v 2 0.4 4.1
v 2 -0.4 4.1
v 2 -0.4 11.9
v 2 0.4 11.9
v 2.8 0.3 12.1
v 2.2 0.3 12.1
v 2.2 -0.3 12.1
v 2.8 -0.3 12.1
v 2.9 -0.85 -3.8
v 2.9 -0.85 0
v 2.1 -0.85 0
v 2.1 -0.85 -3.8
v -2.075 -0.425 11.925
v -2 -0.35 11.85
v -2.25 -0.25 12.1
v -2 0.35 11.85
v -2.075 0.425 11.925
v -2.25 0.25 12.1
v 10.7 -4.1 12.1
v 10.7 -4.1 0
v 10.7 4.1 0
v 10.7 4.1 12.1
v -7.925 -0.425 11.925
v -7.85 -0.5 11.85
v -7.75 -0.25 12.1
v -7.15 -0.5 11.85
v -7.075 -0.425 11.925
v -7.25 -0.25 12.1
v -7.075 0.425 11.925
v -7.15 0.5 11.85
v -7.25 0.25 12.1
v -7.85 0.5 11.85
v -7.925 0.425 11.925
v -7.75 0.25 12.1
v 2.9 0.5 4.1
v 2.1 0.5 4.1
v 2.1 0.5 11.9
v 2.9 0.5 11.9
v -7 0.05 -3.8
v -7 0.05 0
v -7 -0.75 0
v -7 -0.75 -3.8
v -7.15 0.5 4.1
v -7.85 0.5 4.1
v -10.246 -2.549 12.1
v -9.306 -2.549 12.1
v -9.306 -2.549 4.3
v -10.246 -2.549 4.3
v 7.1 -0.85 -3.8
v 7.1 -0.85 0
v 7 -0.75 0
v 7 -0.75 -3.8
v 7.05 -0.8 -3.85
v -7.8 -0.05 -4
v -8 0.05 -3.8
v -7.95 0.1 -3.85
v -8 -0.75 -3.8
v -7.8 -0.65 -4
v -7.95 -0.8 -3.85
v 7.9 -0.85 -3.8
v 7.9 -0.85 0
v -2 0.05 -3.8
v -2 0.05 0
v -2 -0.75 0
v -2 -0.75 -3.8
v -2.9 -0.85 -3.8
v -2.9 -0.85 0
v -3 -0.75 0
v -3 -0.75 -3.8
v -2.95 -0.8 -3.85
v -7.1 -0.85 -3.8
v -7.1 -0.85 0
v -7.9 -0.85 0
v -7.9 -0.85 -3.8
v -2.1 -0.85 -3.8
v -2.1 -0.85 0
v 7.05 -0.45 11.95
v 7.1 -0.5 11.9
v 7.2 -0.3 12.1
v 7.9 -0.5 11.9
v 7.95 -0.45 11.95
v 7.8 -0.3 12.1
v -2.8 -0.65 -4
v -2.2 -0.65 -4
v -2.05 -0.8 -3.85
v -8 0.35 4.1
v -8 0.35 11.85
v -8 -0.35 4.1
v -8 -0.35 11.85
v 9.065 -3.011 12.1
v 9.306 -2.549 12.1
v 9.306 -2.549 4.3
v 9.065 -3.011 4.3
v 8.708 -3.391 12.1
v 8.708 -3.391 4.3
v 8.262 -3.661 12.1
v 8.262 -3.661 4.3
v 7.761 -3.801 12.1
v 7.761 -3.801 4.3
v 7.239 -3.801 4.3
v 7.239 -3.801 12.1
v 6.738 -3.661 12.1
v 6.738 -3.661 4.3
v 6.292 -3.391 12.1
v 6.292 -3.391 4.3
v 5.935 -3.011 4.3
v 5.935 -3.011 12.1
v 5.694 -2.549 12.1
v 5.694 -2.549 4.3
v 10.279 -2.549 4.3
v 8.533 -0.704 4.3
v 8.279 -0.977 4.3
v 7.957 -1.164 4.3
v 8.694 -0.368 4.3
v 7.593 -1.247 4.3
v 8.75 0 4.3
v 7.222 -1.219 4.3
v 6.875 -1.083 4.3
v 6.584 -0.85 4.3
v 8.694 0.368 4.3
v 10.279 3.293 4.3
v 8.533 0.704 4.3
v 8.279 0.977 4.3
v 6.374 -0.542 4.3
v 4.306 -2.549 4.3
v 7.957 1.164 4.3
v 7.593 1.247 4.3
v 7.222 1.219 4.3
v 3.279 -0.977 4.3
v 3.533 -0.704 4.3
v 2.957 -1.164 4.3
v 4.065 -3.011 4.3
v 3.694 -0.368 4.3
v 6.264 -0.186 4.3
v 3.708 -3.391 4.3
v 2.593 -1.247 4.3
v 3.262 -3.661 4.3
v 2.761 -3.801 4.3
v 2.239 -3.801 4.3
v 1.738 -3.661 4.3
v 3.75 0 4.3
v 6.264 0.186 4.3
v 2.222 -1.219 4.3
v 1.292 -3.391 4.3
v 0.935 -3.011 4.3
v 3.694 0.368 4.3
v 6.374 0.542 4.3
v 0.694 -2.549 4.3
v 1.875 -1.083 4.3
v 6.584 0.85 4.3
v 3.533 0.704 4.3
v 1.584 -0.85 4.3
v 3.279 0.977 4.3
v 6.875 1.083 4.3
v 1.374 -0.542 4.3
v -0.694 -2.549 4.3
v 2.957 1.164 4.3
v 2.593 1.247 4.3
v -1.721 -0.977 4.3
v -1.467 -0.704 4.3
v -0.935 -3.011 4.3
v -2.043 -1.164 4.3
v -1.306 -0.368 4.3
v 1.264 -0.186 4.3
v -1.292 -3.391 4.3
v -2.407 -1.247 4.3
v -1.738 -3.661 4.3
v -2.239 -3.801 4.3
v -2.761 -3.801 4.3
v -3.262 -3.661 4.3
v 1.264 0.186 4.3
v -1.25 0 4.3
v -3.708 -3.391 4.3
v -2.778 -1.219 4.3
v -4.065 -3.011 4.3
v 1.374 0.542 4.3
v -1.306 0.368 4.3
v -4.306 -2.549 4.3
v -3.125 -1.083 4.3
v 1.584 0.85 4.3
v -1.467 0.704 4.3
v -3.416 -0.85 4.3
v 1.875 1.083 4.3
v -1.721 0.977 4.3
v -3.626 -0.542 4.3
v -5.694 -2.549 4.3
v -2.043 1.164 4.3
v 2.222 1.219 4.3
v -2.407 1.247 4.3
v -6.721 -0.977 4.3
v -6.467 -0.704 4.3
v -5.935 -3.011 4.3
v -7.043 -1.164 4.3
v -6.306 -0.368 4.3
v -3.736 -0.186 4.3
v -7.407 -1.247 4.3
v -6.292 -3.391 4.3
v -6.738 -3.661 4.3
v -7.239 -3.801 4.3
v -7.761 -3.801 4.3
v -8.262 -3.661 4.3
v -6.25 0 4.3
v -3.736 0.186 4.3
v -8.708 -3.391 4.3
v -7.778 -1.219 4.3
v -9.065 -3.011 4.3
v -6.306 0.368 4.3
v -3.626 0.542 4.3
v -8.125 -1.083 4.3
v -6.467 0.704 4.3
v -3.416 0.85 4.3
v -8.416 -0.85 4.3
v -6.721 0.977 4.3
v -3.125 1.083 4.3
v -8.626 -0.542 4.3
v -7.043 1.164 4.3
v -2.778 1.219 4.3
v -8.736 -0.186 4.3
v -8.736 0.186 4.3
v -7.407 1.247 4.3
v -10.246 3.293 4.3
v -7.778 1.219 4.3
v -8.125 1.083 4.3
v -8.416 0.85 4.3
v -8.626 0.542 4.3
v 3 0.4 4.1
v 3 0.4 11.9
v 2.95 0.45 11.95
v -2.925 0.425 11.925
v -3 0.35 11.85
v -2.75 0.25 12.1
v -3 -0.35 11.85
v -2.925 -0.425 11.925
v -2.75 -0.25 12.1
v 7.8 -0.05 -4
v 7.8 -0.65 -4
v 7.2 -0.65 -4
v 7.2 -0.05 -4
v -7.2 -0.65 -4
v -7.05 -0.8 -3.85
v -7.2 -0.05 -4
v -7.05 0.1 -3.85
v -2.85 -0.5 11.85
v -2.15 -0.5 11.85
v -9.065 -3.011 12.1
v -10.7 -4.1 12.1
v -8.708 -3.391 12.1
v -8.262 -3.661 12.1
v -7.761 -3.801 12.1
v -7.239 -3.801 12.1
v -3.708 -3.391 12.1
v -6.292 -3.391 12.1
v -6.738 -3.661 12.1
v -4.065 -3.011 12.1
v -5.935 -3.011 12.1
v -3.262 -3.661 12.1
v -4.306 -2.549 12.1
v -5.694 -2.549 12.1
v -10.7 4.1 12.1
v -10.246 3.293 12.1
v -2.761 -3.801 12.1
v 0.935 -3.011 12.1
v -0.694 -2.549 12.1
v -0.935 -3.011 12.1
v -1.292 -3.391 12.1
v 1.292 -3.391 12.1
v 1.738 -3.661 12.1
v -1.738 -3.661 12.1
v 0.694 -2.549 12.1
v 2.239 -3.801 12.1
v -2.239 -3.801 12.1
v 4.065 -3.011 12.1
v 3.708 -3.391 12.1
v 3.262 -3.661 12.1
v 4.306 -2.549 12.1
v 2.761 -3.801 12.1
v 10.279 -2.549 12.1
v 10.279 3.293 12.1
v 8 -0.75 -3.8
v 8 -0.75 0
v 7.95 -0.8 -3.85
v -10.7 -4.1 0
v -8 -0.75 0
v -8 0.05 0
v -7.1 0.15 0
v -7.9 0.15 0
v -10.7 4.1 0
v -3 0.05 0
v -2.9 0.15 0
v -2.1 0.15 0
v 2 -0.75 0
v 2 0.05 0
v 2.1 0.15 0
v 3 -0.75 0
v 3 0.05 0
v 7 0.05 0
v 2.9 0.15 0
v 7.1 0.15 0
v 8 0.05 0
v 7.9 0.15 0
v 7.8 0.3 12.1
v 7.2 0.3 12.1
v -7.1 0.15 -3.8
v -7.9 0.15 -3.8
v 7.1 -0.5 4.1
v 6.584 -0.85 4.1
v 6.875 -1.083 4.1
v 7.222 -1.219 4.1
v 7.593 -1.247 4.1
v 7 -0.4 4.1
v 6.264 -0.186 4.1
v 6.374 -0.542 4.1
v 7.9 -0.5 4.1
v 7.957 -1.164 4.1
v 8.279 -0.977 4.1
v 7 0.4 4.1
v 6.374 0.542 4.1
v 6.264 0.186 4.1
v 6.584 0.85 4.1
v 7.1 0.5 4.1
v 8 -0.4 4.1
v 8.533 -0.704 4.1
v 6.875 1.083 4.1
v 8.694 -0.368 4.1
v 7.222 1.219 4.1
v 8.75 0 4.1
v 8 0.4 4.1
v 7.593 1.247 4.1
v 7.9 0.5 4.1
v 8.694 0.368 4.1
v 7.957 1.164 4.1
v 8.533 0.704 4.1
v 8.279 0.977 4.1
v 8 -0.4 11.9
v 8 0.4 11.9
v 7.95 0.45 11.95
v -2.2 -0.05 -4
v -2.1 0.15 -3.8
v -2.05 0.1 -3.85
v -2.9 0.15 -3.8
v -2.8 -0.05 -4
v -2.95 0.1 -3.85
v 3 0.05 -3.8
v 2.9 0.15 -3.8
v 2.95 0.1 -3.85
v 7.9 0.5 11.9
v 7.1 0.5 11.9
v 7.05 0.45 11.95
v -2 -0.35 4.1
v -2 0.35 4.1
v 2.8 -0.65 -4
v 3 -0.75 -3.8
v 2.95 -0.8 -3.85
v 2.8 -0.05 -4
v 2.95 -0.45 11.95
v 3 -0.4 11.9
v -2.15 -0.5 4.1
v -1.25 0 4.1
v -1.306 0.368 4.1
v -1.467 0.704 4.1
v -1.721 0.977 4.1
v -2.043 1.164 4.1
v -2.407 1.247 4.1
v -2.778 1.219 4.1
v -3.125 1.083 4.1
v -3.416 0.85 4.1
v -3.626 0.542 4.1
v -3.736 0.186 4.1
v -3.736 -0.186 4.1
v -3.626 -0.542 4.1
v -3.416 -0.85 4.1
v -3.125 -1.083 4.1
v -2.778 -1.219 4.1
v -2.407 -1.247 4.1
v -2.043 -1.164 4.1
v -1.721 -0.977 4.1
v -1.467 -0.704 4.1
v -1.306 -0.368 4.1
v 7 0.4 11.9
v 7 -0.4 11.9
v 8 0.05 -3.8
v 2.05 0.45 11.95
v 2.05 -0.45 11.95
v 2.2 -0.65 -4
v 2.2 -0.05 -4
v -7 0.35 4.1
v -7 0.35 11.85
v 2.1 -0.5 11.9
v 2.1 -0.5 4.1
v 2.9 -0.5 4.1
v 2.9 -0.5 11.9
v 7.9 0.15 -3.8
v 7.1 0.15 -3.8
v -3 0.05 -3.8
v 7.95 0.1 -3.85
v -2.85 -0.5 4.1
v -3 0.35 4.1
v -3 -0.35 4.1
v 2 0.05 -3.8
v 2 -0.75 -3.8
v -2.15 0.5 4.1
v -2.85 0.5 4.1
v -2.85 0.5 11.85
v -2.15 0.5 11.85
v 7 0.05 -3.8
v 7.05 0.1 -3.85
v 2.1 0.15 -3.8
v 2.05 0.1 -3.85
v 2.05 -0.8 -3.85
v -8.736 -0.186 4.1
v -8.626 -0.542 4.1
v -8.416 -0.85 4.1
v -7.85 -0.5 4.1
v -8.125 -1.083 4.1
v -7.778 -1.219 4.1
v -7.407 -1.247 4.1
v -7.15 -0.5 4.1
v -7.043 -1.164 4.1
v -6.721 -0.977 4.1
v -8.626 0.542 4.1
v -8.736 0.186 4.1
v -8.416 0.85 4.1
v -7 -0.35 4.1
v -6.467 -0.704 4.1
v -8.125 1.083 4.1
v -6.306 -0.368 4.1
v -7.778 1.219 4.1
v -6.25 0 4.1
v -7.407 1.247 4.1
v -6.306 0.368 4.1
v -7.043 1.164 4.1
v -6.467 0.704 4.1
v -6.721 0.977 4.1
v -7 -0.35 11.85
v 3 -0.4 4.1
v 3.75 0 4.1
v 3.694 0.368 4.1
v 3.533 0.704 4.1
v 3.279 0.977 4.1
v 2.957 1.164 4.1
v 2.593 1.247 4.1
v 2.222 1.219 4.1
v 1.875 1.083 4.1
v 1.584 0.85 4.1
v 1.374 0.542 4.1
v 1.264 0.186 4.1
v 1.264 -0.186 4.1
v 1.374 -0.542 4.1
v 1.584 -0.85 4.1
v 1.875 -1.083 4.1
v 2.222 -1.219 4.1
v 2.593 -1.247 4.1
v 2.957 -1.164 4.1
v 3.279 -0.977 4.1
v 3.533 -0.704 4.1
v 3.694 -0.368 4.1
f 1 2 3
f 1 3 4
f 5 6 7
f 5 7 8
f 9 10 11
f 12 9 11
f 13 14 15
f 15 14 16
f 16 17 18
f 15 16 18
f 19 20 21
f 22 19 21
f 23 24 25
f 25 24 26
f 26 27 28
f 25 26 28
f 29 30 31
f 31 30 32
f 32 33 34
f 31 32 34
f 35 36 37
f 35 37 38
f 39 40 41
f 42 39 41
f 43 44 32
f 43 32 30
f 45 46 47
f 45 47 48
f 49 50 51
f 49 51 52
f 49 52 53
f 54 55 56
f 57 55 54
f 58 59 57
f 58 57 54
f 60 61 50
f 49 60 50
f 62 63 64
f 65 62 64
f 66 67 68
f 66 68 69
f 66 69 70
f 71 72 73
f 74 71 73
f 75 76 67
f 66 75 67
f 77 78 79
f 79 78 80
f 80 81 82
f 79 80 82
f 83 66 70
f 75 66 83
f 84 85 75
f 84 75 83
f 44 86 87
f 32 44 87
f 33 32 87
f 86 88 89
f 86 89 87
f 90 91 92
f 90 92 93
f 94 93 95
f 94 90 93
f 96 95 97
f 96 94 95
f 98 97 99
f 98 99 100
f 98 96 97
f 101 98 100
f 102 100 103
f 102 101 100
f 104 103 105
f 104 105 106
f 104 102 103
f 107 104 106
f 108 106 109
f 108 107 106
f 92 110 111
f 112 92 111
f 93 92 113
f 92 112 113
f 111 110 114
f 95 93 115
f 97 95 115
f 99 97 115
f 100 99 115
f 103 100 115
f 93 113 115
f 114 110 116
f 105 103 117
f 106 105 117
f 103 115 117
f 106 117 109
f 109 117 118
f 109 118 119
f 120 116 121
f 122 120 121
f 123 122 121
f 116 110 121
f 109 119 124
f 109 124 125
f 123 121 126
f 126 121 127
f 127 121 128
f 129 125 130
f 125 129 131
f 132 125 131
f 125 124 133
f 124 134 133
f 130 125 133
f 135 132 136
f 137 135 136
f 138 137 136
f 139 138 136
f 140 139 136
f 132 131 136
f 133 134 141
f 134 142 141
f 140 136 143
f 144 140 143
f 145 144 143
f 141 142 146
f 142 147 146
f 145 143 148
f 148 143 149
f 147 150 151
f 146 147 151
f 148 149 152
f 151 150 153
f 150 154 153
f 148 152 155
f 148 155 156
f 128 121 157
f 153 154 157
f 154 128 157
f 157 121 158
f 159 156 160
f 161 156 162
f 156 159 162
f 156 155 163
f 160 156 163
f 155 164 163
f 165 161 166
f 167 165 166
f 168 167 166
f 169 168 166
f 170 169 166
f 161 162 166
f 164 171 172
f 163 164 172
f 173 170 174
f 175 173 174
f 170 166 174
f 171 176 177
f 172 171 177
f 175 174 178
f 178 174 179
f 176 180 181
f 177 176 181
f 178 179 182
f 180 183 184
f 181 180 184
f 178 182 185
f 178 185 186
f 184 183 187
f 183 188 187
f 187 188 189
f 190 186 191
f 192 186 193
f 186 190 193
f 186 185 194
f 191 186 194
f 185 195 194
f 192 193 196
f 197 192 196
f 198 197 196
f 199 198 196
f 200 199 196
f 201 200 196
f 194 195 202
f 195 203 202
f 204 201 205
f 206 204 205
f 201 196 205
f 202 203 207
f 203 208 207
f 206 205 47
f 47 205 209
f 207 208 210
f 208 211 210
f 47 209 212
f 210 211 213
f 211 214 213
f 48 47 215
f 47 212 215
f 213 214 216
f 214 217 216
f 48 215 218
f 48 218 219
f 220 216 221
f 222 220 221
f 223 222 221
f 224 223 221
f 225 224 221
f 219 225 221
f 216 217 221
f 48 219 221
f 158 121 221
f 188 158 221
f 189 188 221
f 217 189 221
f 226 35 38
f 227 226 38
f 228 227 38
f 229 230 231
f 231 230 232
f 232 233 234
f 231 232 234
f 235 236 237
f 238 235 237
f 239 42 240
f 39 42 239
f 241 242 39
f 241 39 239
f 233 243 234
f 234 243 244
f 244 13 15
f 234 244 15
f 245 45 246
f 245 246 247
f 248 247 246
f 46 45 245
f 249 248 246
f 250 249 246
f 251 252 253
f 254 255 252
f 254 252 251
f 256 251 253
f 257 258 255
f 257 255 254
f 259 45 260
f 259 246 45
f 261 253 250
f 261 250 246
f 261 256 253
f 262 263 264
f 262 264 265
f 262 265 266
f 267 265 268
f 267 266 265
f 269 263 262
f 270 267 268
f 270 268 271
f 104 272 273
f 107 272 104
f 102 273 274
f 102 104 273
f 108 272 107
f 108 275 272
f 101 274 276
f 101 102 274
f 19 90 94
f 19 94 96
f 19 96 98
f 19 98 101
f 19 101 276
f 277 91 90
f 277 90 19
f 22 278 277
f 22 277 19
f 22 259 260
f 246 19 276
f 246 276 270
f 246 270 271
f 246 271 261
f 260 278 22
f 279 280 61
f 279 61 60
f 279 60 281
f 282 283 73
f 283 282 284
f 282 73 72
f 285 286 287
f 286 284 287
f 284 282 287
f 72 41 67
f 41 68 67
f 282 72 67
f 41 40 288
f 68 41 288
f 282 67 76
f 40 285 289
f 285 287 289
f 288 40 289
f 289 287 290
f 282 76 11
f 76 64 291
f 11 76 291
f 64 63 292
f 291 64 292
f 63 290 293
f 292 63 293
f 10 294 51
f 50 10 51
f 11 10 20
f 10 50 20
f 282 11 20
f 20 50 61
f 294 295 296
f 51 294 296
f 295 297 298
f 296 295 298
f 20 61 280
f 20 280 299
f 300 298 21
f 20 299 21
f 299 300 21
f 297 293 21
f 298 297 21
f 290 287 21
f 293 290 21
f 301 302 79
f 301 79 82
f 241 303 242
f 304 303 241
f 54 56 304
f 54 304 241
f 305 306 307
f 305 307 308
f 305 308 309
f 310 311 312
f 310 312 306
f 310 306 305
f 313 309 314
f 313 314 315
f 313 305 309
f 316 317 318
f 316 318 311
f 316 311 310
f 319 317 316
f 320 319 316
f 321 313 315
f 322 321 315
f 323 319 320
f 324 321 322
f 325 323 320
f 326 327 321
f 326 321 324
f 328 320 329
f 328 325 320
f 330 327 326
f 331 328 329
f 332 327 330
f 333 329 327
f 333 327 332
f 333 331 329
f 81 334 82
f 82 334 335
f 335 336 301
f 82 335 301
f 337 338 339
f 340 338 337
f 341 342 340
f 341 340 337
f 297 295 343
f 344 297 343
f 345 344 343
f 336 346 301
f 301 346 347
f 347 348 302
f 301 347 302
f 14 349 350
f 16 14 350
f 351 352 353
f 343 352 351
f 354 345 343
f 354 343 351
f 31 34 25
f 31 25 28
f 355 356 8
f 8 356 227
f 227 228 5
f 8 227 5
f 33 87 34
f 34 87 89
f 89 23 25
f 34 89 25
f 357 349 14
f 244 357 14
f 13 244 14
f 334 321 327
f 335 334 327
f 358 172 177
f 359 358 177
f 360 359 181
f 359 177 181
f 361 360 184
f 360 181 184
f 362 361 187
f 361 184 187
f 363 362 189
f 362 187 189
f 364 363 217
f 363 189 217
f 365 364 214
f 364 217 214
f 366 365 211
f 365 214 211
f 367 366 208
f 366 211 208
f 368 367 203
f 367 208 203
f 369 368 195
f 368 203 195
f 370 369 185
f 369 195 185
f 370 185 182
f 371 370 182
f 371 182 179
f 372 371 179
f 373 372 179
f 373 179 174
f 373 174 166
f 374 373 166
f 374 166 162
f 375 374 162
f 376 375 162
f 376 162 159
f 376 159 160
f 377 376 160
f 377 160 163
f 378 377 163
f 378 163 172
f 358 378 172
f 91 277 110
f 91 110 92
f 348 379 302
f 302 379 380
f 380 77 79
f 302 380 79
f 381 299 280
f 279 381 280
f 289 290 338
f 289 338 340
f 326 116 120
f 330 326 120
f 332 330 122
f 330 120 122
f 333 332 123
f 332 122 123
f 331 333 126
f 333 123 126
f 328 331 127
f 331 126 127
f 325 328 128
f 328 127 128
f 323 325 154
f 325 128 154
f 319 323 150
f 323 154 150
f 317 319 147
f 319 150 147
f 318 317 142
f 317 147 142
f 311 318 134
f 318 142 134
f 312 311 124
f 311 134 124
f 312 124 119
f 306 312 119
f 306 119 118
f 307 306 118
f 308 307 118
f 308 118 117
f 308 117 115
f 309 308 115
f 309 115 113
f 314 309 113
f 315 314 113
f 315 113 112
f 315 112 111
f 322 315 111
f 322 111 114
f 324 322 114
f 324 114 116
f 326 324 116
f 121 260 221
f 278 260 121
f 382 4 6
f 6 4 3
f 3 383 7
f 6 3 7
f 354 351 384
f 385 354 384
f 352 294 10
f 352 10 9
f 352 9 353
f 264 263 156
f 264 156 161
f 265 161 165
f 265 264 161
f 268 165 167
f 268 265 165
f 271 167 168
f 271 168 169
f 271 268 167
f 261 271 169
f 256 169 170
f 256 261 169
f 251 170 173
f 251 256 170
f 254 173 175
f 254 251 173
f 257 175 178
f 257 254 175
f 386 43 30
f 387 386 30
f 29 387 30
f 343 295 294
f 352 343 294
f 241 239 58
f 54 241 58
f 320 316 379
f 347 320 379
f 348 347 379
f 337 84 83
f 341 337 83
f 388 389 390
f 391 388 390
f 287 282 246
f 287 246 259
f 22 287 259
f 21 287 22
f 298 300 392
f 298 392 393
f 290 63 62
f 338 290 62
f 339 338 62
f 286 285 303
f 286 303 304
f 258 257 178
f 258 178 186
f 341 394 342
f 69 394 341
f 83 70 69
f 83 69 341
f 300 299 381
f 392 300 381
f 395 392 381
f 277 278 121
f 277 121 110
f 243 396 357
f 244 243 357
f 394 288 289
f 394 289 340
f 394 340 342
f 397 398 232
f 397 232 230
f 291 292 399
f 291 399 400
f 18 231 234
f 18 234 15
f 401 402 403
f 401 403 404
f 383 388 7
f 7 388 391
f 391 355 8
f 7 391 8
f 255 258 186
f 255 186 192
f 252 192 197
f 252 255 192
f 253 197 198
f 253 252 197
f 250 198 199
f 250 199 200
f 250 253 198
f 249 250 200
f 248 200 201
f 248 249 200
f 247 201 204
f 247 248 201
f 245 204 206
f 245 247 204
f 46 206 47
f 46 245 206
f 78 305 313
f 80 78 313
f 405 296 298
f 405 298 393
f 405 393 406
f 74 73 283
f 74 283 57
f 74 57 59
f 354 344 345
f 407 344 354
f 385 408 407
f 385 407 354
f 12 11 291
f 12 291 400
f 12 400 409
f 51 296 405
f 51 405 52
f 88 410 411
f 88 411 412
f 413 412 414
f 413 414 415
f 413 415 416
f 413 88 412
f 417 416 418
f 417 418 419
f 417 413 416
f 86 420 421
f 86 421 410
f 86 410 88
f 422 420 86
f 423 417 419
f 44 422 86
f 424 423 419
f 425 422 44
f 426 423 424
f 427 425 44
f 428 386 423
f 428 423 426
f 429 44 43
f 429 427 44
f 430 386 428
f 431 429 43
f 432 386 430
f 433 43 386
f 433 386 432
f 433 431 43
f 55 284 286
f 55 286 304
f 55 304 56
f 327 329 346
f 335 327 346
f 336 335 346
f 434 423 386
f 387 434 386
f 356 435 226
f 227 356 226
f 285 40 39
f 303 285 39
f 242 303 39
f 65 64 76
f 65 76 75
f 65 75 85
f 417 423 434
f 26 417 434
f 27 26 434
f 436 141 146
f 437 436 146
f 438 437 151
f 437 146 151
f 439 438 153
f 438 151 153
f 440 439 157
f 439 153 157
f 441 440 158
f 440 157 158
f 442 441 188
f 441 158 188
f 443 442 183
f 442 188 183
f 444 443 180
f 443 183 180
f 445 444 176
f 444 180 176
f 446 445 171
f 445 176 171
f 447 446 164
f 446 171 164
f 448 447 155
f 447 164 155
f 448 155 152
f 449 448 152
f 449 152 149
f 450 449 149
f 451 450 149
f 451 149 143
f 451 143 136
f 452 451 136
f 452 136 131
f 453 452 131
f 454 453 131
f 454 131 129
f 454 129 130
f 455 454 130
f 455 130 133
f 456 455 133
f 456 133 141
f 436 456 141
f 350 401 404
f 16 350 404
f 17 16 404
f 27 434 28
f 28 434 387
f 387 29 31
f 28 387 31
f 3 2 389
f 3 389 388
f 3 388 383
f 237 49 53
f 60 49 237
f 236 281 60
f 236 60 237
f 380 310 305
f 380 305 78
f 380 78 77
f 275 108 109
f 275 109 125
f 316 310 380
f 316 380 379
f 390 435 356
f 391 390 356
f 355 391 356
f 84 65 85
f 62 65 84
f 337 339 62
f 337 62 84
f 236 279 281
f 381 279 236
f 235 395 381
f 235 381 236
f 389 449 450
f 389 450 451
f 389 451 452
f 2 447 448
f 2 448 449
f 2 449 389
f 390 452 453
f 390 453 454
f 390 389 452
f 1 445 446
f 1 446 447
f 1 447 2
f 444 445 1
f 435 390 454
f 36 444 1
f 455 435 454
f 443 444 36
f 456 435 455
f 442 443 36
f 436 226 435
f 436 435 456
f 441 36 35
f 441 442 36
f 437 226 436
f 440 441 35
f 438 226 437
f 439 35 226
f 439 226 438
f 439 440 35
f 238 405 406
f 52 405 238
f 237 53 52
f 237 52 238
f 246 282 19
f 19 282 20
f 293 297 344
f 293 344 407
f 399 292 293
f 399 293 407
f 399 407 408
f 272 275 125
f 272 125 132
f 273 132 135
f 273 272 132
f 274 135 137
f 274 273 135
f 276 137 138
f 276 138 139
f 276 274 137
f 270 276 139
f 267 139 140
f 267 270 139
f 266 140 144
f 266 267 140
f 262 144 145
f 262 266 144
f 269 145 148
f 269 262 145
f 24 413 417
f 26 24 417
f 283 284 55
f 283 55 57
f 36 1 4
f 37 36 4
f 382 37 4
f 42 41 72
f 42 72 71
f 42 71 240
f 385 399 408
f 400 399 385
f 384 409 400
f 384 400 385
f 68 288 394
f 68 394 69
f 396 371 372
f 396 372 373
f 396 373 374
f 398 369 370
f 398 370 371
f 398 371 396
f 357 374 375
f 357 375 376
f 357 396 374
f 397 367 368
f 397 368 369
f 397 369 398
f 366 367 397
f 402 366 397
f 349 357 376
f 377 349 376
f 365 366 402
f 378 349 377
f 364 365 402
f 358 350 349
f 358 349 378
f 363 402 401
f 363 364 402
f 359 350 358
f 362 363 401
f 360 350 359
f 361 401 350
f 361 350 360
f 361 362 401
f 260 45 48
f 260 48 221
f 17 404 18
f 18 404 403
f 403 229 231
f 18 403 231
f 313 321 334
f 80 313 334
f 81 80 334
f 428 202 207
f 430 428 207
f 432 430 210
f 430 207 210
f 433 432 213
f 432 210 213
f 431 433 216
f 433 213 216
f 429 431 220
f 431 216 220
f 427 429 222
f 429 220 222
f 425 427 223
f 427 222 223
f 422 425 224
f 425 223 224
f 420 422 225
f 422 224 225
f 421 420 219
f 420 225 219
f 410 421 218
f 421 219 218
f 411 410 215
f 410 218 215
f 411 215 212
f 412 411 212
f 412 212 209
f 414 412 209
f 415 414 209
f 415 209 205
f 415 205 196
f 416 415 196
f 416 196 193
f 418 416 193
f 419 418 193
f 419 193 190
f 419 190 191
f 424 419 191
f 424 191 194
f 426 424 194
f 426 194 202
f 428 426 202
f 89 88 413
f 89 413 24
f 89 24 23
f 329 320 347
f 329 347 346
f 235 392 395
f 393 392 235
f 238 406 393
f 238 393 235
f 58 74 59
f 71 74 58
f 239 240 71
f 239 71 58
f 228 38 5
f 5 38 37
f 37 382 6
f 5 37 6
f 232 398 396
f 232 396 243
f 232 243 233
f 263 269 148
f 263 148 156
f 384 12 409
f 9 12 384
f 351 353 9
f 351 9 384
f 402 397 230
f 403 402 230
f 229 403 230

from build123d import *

# Parameters (mm, degrees)
SKETCH_1_W          = 21.4
SKETCH_1_H          = 8.2
EXTRUDE_1_DEPTH     = 12.1
SKETCH_4_R          = 1.25
CUT_EXTRUDE_3_DEPTH = 8
CUT_EXTRUDE_4_DEPTH = 7.8
SKETCH_7_W          = 1
SKETCH_7_H          = 1
EXTRUDE_2_DEPTH     = 8
CHAMFER_1_SIZE      = 0.15
CHAMFER_2_SIZE      = 0.25
SKETCH_8_W          = 1
SKETCH_8_H          = 1
EXTRUDE_3_DEPTH     = 4
CHAMFER_6_SIZE      = 0.1
CHAMFER_7_SIZE      = 0.2
CHAMFER_10_SIZE     = 0.1
CHAMFER_11_SIZE     = 0.2
CHAMFER_12_SIZE     = 0.1
CHAMFER_13_SIZE     = 0.2
CHAMFER_14_SIZE     = 0.1
CHAMFER_15_SIZE     = 0.2


with BuildPart() as part:
    # Эскиз1 → Бобышка-Вытянуть1 (new body)
    with BuildSketch(Plane.XY):
        Rectangle(SKETCH_1_W, SKETCH_1_H)
    extrude(amount=EXTRUDE_1_DEPTH)

    # Эскиз4 → Вырез-Вытянуть3 (cut)
    with BuildSketch(Plane.XY.offset(12.1)):
        with Locations((-7.5, 0)):
            Circle(SKETCH_4_R)
        with Locations((-2.5, 0)):
            Circle(SKETCH_4_R)
        with Locations((2.5, 0)):
            Circle(SKETCH_4_R)
        with Locations((7.5, 0)):
            Circle(SKETCH_4_R)
    extrude(amount=-CUT_EXTRUDE_3_DEPTH, mode=Mode.SUBTRACT)

    # Эскиз5 → Вырез-Вытянуть4 (cut)
    with BuildSketch(Plane.XY.offset(12.1)):
        with BuildLine():
            Line((-10.245621634, 0), (-10.245621634, 3.292901982))
            Line((-10.245621634, 3.292901982), (0.278509544, 3.292901982))
            Line((0.278509544, 3.292901982), (5.278509544, 3.292901982))
            Line((5.278509544, 3.292901982), (10.278509544, 3.292901982))
            Line((10.278509544, 3.292901982), (10.278509544, -2.548957219))
            Line((10.278509544, -2.548957219), (9.30582632, -2.548957219))
            ThreePointArc((9.30582632, -2.548957219), (7.5, -3.818893996), (5.69417368, -2.548957219))
            Line((5.69417368, -2.548957219), (4.30582632, -2.548957219))
            ThreePointArc((4.30582632, -2.548957219), (2.5, -3.818893996), (0.69417368, -2.548957219))
            Line((0.69417368, -2.548957219), (-0.69417368, -2.548957219))
            ThreePointArc((-0.69417368, -2.548957219), (-2.5, -3.818893996), (-4.30582632, -2.548957219))
            Line((-4.30582632, -2.548957219), (-5.69417368, -2.548957219))
            ThreePointArc((-5.69417368, -2.548957219), (-7.5, -3.818893996), (-9.30582632, -2.548957219))
            Line((-9.30582632, -2.548957219), (-10.245621634, -2.548957219))
            Line((-10.245621634, -2.548957219), (-10.245621634, 0))
        make_face()
    extrude(amount=-CUT_EXTRUDE_4_DEPTH, mode=Mode.SUBTRACT)

    # Эскиз7 → Бобышка-Вытянуть2 (add)
    with BuildSketch(Plane.XY.offset(4.1)):
        with Locations((-2.5, 0)):
            Rectangle(SKETCH_7_W, SKETCH_7_H)
        with Locations((-7.5, 0)):
            Rectangle(SKETCH_7_W, SKETCH_7_H)
        with Locations((2.5, 0)):
            Rectangle(SKETCH_7_W, SKETCH_7_H)
        with Locations((7.5, 0)):
            Rectangle(SKETCH_7_W, SKETCH_7_H)
    extrude(amount=EXTRUDE_2_DEPTH)

    # Фаска1
    chamfer_1_edges = [part.edges().sort_by_distance(p)[0] for p in [
        (-7, -0.5, 8.1),
        (-7, 0.5, 8.1),
        (-8, 0.5, 8.1),
        (-8, -0.5, 8.1),
        (-2, -0.5, 8.1),
        (-2, 0.5, 8.1),
        (-3, 0.5, 8.1),
        (-3, -0.5, 8.1),
    ]]
    chamfer(chamfer_1_edges, length=CHAMFER_1_SIZE)

    # Фаска2
    # the kernel refuses this chamfer: 0.25 mm, written as the material it takes off along each edge
    with BuildSketch(Plane(origin=(-3, -0.992920747, 12.1), x_dir=(-0.02749587661058555, 0, -0.9996219169112968), z_dir=(0, 1, 0)), Plane(origin=(-3.492920747, 0.5, 12.1), x_dir=(0, 0.027495876610586414, -0.9996219169112968), z_dir=(1, 0, 0)), Plane(origin=(-2, 0.992920747, 12.1), x_dir=(0.027495876610586414, 0, -0.9996219169112968), z_dir=(0, -1, 0)), Plane(origin=(-1.507079253, -0.5, 12.1), x_dir=(0, -0.027495876610586414, -0.9996219169112968), z_dir=(-1, 0, 0)), Plane(origin=(-7, 0.992920747, 12.1), x_dir=(0.02749587661058555, 0, -0.9996219169112968), z_dir=(0, -1, 0)), Plane(origin=(-6.507079253, -0.5, 12.1), x_dir=(0, -0.027495876610586414, -0.9996219169112968), z_dir=(-1, 0, 0)), Plane(origin=(-8, -0.992920747, 12.1), x_dir=(-0.027495876610589005, 0, -0.9996219169112968), z_dir=(0, 1, 0)), Plane(origin=(-8.492920747, 0.5, 12.1), x_dir=(0, 0.027495876610586414, -0.9996219169112968), z_dir=(1, 0, 0))) as chamfer_2_piece_1:
        Polygon((CHAMFER_2_SIZE * 0.999621916911, -CHAMFER_2_SIZE * 0.0274958766106), (-CHAMFER_2_SIZE * 0.0274958766106, -CHAMFER_2_SIZE * 0.999621916911), (0, 0), align=None)
    extrude(amount=1.985841494, mode=Mode.SUBTRACT)

    # Эскиз8 → Бобышка-Вытянуть3 (add)
    with BuildSketch(Plane(origin=(0, -4.1, 0), x_dir=(-1, 0, 0), z_dir=(0, 0, 1))):
        with Locations((2.5, -3.75)):
            Rectangle(SKETCH_8_W, SKETCH_8_H)
        with Locations((7.5, -3.75)):
            Rectangle(SKETCH_8_W, SKETCH_8_H)
        with Locations((-2.5, -3.75)):
            Rectangle(SKETCH_8_W, SKETCH_8_H)
        with Locations((-7.5, -3.75)):
            Rectangle(SKETCH_8_W, SKETCH_8_H)
    extrude(amount=-EXTRUDE_3_DEPTH)

    # Фаска6
    chamfer_6_edges = [part.edges().sort_by_distance(p)[0] for p in [
        (3, -0.5, 8.1),
        (3, 0.5, 8.1),
        (2, 0.5, 8.1),
        (2, -0.5, 8.1),
    ]]
    chamfer(chamfer_6_edges, length=CHAMFER_6_SIZE)

    # Фаска7
    # the kernel refuses this chamfer: 0.2 mm, written as the material it takes off along each edge
    with BuildSketch(Plane(origin=(3, 0.914336598, 12.1), x_dir=(0.02749587661058742, 0, -0.9996219169112966), z_dir=(0, -1, 0)), Plane(origin=(3.414336598, -0.5, 12.1), x_dir=(0, -0.02749587661058634, -0.9996219169112966), z_dir=(-1, 0, 0)), Plane(origin=(2, -0.914336598, 12.1), x_dir=(-0.02749587661058634, 0, -0.9996219169112966), z_dir=(0, 1, 0)), Plane(origin=(1.585663402, 0.5, 12.1), x_dir=(0, 0.02749587661058634, -0.9996219169112966), z_dir=(1, 0, 0))) as chamfer_7_piece_1:
        Polygon((CHAMFER_7_SIZE * 0.999621916911, -CHAMFER_7_SIZE * 0.0274958766106), (-CHAMFER_7_SIZE * 0.0274958766106, -CHAMFER_7_SIZE * 0.999621916911), (0, 0), align=None)
    extrude(amount=1.828673195, mode=Mode.SUBTRACT)

    # Фаска10
    chamfer_10_edges = [part.edges().sort_by_distance(p)[0] for p in [
        (-7, 0.15, -2),
        (-7, -0.85, -2),
        (-8, -0.85, -2),
        (-8, 0.15, -2),
        (-2, 0.15, -2),
        (-2, -0.85, -2),
        (-3, -0.85, -2),
        (-3, 0.15, -2),
        (3, 0.15, -2),
        (3, -0.85, -2),
        (2, -0.85, -2),
        (2, 0.15, -2),
    ]]
    chamfer(chamfer_10_edges, length=CHAMFER_10_SIZE)

    # Фаска11
    # the kernel refuses this chamfer: 0.2 mm, written as the material it takes off along each edge
    with BuildSketch(Plane(origin=(-7, 0.564336598, -4), x_dir=(0.027495876610587302, 0, 0.9996219169112966), z_dir=(0, -1, 0)), Plane(origin=(-8.414336598, 0.15, -4), x_dir=(0, 0.027495876610586355, 0.9996219169112966), z_dir=(1, 0, 0)), Plane(origin=(-8, -1.264336598, -4), x_dir=(-0.027495876610587302, 0, 0.9996219169112966), z_dir=(0, 1, 0)), Plane(origin=(-6.585663402, -0.85, -4), x_dir=(0, -0.027495876610586223, 0.9996219169112966), z_dir=(-1, 0, 0)), Plane(origin=(-1.585663402, -0.85, -4), x_dir=(0, -0.027495876610586223, 0.9996219169112966), z_dir=(-1, 0, 0)), Plane(origin=(-3, -1.264336598, -4), x_dir=(-0.027495876610587302, 0, 0.9996219169112966), z_dir=(0, 1, 0)), Plane(origin=(-3.414336598, 0.15, -4), x_dir=(0, 0.027495876610586355, 0.9996219169112966), z_dir=(1, 0, 0)), Plane(origin=(-2, 0.564336598, -4), x_dir=(0.027495876610586223, 0, 0.9996219169112966), z_dir=(0, -1, 0)), Plane(origin=(2, -1.264336598, -4), x_dir=(-0.027495876610586223, 0, 0.9996219169112966), z_dir=(0, 1, 0)), Plane(origin=(1.585663402, 0.15, -4), x_dir=(0, 0.027495876610586355, 0.9996219169112966), z_dir=(1, 0, 0)), Plane(origin=(3, 0.564336598, -4), x_dir=(0.027495876610587302, 0, 0.9996219169112966), z_dir=(0, -1, 0)), Plane(origin=(3.414336598, -0.85, -4), x_dir=(0, -0.027495876610586223, 0.9996219169112966), z_dir=(-1, 0, 0))) as chamfer_11_piece_1:
        Polygon((CHAMFER_11_SIZE * 0.999621916911, CHAMFER_11_SIZE * 0.0274958766106), (-CHAMFER_11_SIZE * 0.0274958766106, CHAMFER_11_SIZE * 0.999621916911), (0, 0), align=None)
    extrude(amount=1.828673195, mode=Mode.SUBTRACT)

    # Фаска12
    chamfer_12_edges = [part.edges().sort_by_distance(p)[0] for p in [
        (8, 0.15, -2),
        (8, -0.85, -2),
        (7, -0.85, -2),
        (7, 0.15, -2),
    ]]
    chamfer(chamfer_12_edges, length=CHAMFER_12_SIZE)

    # Фаска13
    # the kernel refuses this chamfer: 0.2 mm, written as the material it takes off along each edge
    with BuildSketch(Plane(origin=(6.585663402, 0.15, -4), x_dir=(0, 0.027495876610586355, 0.9996219169112966), z_dir=(1, 0, 0)), Plane(origin=(8, 0.564336598, -4), x_dir=(0.027495876610587302, 0, 0.9996219169112966), z_dir=(0, -1, 0)), Plane(origin=(7, -1.264336598, -4), x_dir=(-0.027495876610587302, 0, 0.9996219169112966), z_dir=(0, 1, 0)), Plane(origin=(8.414336598, -0.85, -4), x_dir=(0, -0.027495876610586223, 0.9996219169112966), z_dir=(-1, 0, 0))) as chamfer_13_piece_1:
        Polygon((CHAMFER_13_SIZE * 0.999621916911, CHAMFER_13_SIZE * 0.0274958766106), (-CHAMFER_13_SIZE * 0.0274958766106, CHAMFER_13_SIZE * 0.999621916911), (0, 0), align=None)
    extrude(amount=1.828673195, mode=Mode.SUBTRACT)

    # Фаска14
    chamfer_14_edges = [part.edges().sort_by_distance(p)[0] for p in [
        (8, -0.5, 8.1),
        (8, 0.5, 8.1),
        (7, 0.5, 8.1),
        (7, -0.5, 8.1),
    ]]
    chamfer(chamfer_14_edges, length=CHAMFER_14_SIZE)

    # Фаска15
    # the kernel refuses this chamfer: 0.2 mm, written as the material it takes off along each edge
    with BuildSketch(Plane(origin=(7, -0.914336598, 12.1), x_dir=(-0.02749587661058742, 0, -0.9996219169112966), z_dir=(0, 1, 0)), Plane(origin=(8.414336598, -0.5, 12.1), x_dir=(0, -0.02749587661058634, -0.9996219169112966), z_dir=(-1, 0, 0)), Plane(origin=(8, 0.914336598, 12.1), x_dir=(0.02749587661058742, 0, -0.9996219169112966), z_dir=(0, -1, 0)), Plane(origin=(6.585663402, 0.5, 12.1), x_dir=(0, 0.02749587661058634, -0.9996219169112966), z_dir=(1, 0, 0))) as chamfer_15_piece_1:
        Polygon((CHAMFER_15_SIZE * 0.999621916911, -CHAMFER_15_SIZE * 0.0274958766106), (-CHAMFER_15_SIZE * 0.0274958766106, -CHAMFER_15_SIZE * 0.999621916911), (0, 0), align=None)
    extrude(amount=1.828673195, mode=Mode.SUBTRACT)


solid = part.part
